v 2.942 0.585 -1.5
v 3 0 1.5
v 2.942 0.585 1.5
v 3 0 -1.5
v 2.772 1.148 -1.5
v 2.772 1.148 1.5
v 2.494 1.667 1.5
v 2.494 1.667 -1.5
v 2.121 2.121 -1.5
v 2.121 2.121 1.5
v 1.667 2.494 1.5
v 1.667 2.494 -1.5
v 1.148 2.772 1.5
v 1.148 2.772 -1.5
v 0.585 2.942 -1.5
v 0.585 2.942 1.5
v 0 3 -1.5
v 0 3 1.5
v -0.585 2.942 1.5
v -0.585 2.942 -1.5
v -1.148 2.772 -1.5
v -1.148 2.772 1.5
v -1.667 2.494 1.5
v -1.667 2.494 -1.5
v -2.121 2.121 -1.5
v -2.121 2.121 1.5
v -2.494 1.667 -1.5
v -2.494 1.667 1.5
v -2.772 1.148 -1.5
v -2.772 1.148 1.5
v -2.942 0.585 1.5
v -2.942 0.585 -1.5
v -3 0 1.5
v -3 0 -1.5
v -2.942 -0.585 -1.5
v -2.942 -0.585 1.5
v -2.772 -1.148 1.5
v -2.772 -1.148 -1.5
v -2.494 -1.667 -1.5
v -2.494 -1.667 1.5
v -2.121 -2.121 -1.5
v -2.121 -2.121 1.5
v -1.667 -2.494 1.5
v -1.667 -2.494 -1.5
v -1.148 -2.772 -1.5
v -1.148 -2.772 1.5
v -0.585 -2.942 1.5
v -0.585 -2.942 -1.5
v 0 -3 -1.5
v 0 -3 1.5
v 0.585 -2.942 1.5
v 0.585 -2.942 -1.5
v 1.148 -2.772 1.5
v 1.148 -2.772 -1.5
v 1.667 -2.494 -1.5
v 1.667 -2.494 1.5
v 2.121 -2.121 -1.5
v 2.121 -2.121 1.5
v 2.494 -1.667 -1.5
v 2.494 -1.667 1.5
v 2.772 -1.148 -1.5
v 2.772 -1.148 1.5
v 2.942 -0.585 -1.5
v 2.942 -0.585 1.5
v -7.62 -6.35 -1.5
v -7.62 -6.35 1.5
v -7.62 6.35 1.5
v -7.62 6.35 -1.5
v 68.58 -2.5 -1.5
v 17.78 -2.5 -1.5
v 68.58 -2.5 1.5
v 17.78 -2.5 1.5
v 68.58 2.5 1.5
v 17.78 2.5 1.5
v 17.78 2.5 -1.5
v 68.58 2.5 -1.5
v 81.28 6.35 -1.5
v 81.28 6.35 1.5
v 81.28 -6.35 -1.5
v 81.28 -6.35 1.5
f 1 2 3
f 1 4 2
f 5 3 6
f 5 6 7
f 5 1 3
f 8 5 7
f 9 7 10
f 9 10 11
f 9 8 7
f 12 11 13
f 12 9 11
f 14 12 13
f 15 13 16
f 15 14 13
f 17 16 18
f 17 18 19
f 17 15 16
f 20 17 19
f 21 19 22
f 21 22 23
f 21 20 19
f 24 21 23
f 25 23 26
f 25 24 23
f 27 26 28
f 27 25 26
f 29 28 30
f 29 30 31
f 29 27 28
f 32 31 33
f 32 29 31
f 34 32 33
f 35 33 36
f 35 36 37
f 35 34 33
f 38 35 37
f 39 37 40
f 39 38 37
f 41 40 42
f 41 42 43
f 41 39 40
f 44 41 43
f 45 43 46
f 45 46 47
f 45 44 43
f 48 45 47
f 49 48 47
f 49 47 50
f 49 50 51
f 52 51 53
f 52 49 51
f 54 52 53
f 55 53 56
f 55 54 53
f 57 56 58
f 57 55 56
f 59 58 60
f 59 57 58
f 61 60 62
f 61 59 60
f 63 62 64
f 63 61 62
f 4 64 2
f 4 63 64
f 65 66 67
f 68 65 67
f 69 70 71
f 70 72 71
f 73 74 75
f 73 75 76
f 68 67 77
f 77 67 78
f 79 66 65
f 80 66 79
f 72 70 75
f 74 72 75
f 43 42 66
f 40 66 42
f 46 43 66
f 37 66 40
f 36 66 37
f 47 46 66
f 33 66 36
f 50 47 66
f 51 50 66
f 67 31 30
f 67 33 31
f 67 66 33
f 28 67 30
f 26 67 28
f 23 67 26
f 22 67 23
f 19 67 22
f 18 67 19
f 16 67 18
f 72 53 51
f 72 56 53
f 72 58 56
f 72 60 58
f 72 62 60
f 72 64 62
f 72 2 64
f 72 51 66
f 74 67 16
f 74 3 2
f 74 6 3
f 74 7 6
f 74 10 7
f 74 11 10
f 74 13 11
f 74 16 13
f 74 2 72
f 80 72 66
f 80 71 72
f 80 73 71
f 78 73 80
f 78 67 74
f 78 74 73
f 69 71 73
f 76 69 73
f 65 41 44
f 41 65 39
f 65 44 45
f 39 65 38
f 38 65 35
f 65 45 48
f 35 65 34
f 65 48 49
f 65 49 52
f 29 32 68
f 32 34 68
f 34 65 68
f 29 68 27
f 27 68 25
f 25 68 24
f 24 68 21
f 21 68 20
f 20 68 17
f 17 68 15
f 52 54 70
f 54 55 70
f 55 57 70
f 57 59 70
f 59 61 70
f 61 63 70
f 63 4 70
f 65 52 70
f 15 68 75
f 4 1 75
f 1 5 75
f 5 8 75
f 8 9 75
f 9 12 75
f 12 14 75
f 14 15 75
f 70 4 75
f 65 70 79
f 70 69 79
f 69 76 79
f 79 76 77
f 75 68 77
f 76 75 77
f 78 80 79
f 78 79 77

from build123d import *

# Parameters (mm, degrees)
SKETCH1_W           = 88.9
SKETCH1_H           = 12.7
SKETCH1_R           = 3
SKETCH1_W_2         = 50.8
SKETCH1_H_2         = 5
BOSS_EXTRUDE1_DEPTH = 1.5


with BuildPart() as part:
    # Sketch1 → Boss-Extrude1 (new body, symmetric)
    with BuildSketch(Plane.XY):
        with Locations((36.83, 0)):
            Rectangle(SKETCH1_W, SKETCH1_H)
        Circle(SKETCH1_R, mode=Mode.SUBTRACT)
        with Locations((43.18, 0)):
            Rectangle(SKETCH1_W_2, SKETCH1_H_2, mode=Mode.SUBTRACT)
    extrude(amount=BOSS_EXTRUDE1_DEPTH, both=True)


solid = part.part
